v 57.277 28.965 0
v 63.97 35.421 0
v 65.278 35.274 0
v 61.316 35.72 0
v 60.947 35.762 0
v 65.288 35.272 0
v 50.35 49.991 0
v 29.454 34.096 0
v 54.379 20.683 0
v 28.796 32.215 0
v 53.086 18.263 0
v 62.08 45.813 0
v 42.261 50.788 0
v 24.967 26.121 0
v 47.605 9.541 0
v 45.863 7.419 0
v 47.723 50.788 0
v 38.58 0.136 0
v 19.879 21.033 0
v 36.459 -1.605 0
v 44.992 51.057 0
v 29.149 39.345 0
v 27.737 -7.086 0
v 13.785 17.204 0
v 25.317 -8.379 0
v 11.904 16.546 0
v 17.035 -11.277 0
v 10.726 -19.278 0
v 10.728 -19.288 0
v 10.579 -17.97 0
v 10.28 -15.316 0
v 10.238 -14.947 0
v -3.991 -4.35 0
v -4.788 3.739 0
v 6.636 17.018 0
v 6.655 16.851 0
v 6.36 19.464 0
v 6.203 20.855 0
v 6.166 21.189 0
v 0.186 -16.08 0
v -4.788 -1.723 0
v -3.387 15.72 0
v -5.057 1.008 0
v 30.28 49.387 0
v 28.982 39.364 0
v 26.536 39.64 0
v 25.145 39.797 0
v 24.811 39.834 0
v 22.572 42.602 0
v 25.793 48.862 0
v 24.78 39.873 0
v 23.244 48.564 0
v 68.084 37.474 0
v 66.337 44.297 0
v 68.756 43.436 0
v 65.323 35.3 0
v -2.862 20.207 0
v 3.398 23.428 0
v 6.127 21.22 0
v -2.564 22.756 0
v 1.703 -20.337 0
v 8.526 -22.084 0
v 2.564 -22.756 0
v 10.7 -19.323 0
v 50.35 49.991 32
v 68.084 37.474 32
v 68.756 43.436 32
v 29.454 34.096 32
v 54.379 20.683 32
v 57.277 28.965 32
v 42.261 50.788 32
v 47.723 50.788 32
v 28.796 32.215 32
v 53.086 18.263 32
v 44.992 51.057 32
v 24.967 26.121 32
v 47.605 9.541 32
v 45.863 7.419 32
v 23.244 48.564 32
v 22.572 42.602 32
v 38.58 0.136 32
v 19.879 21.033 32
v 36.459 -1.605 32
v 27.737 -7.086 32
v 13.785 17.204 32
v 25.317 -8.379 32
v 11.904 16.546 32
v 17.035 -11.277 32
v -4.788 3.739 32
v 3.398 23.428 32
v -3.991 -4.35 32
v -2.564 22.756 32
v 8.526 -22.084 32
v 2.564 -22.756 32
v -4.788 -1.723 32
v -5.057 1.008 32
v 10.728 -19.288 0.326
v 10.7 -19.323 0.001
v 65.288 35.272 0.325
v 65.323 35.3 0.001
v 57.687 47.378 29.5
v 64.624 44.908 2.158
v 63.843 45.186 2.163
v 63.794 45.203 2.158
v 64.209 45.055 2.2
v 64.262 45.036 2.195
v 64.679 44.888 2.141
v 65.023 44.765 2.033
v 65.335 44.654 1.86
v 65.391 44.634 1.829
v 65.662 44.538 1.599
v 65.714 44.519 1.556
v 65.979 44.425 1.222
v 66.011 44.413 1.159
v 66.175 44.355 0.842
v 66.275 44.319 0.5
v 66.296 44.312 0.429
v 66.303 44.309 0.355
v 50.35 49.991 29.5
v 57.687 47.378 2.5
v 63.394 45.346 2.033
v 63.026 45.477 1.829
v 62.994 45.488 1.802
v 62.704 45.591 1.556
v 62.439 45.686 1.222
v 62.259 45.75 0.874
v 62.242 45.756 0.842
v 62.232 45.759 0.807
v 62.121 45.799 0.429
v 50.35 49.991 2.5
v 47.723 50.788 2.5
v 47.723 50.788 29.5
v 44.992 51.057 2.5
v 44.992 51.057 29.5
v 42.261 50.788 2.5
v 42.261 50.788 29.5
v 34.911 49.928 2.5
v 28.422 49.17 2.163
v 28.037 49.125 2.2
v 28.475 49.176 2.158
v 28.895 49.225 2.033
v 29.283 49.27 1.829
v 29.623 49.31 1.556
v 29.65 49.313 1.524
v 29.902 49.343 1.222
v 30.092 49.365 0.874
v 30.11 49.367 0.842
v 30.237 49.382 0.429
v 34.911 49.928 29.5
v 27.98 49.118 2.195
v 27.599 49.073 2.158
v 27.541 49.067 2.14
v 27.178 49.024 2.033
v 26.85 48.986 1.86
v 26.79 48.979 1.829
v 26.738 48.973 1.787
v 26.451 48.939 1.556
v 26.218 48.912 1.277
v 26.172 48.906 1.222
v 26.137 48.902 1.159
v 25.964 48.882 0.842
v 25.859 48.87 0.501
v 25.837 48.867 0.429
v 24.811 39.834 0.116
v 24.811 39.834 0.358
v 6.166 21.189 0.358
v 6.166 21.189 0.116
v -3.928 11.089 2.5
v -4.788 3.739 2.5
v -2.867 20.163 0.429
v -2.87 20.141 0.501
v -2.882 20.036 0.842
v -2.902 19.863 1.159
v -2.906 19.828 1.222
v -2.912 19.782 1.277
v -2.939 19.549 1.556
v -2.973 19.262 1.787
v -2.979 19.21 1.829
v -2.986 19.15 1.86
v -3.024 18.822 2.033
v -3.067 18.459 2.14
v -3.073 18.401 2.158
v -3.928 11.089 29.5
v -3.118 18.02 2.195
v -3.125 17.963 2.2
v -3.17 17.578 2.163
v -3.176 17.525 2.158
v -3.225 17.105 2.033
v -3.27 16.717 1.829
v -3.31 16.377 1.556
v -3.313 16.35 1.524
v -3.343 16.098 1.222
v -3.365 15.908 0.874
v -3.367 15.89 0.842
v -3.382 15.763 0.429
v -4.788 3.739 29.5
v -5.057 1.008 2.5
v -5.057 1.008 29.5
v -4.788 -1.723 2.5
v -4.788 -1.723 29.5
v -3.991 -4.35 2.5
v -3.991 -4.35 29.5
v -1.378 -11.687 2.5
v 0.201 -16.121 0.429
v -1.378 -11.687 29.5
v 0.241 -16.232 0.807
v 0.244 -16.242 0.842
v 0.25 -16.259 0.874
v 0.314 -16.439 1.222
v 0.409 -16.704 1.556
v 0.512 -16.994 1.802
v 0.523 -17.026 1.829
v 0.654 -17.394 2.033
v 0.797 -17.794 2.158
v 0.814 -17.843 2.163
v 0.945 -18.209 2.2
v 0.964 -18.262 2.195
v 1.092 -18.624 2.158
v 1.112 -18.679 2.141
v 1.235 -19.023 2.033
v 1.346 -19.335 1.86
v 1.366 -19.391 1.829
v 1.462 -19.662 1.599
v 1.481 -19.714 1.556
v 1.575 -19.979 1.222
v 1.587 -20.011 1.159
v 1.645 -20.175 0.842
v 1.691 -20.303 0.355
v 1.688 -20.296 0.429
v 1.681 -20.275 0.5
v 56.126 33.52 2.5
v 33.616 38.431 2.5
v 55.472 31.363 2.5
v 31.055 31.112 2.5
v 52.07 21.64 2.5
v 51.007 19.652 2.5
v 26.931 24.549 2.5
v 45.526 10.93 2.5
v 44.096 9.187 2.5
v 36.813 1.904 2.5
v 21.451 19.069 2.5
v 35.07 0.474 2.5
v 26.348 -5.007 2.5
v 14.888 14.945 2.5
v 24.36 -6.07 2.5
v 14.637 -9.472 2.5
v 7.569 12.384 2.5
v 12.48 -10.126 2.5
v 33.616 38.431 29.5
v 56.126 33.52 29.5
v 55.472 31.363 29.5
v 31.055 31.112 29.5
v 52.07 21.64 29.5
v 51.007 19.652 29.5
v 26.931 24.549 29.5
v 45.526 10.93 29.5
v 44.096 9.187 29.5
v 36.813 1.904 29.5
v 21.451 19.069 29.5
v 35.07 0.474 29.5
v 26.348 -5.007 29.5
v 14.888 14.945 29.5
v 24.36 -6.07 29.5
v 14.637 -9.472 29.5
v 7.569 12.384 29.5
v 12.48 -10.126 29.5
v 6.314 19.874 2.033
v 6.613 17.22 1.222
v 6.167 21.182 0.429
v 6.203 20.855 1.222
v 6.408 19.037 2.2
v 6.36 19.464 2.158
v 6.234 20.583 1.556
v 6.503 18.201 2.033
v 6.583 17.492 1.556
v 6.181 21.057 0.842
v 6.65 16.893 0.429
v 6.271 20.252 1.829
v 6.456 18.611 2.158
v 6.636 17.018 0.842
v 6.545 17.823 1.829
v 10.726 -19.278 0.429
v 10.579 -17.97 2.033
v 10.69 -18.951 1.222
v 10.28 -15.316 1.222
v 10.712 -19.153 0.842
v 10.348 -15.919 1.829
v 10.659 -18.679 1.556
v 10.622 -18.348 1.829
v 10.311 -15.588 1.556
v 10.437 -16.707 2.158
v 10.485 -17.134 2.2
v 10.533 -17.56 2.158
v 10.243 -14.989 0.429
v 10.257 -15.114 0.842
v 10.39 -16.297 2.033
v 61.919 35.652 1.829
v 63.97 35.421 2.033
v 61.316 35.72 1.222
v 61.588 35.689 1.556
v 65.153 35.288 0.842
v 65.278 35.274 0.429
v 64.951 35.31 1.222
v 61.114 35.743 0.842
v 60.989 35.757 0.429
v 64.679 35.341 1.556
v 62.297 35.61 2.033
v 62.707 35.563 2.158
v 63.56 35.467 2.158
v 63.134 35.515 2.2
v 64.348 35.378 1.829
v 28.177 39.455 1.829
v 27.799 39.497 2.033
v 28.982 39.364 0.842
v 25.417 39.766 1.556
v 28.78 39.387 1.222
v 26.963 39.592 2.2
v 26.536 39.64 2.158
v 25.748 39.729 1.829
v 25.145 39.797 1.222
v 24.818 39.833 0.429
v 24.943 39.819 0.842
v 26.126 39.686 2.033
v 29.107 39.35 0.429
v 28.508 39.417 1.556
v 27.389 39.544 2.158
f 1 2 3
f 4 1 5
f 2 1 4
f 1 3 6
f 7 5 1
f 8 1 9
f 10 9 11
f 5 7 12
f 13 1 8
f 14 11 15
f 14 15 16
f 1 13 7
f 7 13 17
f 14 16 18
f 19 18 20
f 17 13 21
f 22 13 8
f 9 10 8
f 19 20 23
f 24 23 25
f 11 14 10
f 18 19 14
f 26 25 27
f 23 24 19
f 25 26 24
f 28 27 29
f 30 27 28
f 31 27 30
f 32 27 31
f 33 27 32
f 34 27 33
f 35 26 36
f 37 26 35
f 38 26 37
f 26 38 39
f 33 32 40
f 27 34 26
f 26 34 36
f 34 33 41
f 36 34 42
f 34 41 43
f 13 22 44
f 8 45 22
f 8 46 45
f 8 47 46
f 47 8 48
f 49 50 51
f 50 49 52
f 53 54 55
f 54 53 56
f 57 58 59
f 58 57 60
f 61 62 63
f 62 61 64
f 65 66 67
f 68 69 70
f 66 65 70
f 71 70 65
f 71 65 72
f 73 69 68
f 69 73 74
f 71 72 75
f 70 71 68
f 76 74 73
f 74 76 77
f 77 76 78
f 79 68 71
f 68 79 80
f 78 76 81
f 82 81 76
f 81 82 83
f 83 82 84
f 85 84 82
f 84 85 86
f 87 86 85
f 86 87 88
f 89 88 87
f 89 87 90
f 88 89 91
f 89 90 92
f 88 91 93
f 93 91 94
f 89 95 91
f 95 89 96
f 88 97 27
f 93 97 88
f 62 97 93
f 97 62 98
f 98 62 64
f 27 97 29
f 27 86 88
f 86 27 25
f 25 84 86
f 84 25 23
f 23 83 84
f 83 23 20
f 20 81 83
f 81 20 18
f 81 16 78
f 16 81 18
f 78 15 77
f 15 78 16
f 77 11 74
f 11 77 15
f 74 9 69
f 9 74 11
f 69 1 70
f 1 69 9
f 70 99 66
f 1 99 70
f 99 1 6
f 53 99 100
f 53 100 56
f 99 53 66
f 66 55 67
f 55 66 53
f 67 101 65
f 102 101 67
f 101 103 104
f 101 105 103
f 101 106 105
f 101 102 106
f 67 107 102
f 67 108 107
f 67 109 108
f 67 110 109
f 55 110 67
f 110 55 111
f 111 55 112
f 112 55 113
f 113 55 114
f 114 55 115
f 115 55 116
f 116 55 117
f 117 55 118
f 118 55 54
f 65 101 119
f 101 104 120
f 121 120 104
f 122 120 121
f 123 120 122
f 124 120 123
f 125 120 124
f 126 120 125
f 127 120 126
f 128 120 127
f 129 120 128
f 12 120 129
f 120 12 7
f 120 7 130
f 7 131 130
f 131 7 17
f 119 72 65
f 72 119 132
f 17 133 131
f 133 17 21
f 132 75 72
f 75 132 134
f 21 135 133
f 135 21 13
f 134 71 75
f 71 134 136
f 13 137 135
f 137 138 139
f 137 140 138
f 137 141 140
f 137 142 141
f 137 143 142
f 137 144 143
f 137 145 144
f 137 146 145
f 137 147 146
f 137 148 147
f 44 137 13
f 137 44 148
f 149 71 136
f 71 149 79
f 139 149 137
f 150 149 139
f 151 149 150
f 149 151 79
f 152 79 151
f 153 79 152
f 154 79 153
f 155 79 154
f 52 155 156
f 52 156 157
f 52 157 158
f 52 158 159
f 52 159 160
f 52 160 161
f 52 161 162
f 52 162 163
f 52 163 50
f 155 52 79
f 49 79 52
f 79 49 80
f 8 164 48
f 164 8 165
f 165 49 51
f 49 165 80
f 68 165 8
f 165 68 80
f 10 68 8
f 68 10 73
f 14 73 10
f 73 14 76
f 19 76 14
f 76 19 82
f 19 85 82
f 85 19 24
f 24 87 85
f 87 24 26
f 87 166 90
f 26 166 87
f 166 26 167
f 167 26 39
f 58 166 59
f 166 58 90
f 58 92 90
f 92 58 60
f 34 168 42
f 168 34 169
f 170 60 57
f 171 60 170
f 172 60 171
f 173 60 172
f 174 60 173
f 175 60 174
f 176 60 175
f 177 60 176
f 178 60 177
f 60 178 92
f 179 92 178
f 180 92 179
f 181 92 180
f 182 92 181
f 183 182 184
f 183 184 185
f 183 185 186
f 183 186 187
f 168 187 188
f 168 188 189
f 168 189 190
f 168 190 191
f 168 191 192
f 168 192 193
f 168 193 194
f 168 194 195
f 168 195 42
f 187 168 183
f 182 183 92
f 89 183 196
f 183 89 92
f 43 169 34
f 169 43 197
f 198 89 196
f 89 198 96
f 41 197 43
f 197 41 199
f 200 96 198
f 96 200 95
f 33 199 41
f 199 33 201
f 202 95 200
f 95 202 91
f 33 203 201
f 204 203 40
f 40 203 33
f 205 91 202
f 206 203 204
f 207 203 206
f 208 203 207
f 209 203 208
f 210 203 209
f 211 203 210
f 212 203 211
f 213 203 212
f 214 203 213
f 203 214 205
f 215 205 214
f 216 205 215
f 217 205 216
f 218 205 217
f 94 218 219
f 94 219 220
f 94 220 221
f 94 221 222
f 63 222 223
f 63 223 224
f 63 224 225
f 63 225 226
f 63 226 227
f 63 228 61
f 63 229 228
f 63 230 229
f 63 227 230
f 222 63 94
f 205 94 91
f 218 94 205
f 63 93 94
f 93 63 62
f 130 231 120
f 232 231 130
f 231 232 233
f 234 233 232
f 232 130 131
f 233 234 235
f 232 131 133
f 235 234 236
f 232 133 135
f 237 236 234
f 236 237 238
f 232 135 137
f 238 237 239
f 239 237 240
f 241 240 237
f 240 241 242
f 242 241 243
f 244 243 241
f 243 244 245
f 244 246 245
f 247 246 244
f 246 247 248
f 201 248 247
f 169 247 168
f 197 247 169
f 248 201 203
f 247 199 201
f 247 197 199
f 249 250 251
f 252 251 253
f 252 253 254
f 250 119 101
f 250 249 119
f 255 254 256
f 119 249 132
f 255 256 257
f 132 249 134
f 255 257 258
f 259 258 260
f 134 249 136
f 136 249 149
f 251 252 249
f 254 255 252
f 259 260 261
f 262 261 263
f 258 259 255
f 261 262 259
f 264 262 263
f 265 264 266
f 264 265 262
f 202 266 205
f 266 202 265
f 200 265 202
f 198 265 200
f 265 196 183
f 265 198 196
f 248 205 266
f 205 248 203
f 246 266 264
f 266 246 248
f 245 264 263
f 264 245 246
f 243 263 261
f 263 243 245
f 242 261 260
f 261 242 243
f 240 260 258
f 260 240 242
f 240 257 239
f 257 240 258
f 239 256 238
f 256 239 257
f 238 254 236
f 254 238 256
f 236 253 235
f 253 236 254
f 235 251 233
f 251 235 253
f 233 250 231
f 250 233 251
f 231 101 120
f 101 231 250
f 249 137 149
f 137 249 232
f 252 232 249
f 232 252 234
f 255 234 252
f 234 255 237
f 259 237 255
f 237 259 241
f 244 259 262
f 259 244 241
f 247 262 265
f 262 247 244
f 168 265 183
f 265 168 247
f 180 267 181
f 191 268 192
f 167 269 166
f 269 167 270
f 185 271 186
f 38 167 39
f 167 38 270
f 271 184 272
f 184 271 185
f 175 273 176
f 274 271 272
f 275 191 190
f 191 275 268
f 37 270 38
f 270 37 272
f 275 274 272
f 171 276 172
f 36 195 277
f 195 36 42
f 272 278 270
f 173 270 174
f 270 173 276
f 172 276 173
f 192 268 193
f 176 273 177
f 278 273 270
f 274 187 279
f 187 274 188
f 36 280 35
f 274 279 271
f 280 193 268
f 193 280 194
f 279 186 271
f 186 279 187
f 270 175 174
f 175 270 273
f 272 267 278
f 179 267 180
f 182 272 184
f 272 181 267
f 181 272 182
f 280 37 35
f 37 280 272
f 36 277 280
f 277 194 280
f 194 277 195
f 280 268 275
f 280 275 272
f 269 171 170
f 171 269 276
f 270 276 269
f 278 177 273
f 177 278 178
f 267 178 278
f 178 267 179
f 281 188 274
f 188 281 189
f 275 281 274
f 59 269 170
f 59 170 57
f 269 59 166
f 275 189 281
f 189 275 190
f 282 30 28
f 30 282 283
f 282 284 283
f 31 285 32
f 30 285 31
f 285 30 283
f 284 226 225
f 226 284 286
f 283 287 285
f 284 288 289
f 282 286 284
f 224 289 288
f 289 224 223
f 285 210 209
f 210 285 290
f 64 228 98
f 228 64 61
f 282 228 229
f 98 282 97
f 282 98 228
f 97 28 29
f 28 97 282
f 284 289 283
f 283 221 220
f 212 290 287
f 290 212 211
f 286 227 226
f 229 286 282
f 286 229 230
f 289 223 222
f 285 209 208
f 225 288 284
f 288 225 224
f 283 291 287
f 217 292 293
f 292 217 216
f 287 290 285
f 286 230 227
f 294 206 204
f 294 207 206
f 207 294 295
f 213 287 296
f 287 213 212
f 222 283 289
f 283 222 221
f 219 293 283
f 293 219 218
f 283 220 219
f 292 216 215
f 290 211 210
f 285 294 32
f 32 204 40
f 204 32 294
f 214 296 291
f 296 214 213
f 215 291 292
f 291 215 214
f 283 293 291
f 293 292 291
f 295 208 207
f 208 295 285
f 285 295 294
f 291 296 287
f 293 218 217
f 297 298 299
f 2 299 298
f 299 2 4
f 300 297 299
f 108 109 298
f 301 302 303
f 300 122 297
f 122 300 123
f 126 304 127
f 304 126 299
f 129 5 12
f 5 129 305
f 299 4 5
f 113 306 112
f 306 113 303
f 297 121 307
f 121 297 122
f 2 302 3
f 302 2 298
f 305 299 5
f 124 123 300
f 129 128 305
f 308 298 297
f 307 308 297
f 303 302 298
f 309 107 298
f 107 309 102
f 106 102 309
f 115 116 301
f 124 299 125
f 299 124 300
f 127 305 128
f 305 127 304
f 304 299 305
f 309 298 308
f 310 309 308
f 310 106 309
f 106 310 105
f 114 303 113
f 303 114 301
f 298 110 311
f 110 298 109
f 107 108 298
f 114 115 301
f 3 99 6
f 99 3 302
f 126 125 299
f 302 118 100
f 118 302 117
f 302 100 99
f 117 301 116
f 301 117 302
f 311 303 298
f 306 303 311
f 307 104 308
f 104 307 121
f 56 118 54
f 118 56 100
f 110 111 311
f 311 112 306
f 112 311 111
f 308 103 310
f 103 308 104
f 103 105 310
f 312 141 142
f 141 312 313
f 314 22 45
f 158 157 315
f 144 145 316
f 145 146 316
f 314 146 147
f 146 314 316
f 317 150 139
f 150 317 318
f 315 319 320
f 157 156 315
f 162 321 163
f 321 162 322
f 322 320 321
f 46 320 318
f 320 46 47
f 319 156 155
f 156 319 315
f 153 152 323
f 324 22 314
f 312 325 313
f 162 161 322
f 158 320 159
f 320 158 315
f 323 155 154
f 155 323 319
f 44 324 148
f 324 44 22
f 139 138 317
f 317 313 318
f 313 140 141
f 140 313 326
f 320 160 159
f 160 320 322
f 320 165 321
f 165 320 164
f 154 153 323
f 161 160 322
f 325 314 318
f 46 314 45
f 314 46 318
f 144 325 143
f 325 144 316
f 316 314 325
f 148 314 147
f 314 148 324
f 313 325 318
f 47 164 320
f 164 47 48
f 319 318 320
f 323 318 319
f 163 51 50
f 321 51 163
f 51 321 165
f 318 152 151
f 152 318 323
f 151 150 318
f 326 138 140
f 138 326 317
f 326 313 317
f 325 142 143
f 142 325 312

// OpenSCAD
$fn = 32;

// ----------------------------------------------------------------------
// Air duct: 28 mm duct, 2.5 mm wall, 32 mm across
// ----------------------------------------------------------------------

// --- parameters (mm) ---
duct_r = 14;              // duct core radius
duct_d = 28;              // duct core diameter
wall = 2.5;               // duct wall thickness
height = 32;              // duct width (extrusion height)
port_r = 22.9;            // port flange half width
port_d = 45.8;            // port flange width
port_t = 6;               // port flange thickness
bolt_d = 4.4;             // port bolt holes
bolt_offset = 18.2;       // bolt hole offset from the port axis

difference() {
  /* outer hull chain: tube with a flat flange plate at every port */
  linear_extrude(height = 32) {
    hull() {
      polygon([[2.564, -22.756], [-2.564, 22.756], [3.398, 23.428], [8.526, -22.084]]);
      translate([8.943, 1.008]) circle(r = 14);
    }
    hull() {
      translate([8.943, 1.008]) circle(r = 14);
      translate([10.236, 1.153]) circle(r = 14);
    }
    hull() {
      translate([10.236, 1.153]) circle(r = 14);
      translate([19.959, 4.555]) circle(r = 14);
    }
    hull() {
      translate([19.959, 4.555]) circle(r = 14);
      translate([28.681, 10.036]) circle(r = 14);
    }
    hull() {
      translate([28.681, 10.036]) circle(r = 14);
      translate([35.964, 17.319]) circle(r = 14);
    }
    hull() {
      translate([35.964, 17.319]) circle(r = 14);
      translate([41.445, 26.041]) circle(r = 14);
    }
    hull() {
      translate([41.445, 26.041]) circle(r = 14);
      translate([44.847, 35.764]) circle(r = 14);
    }
    hull() {
      translate([44.847, 35.764]) circle(r = 14);
      translate([44.992, 37.057]) circle(r = 14);
    }
    hull() {
      translate([44.992, 37.057]) circle(r = 14);
      polygon([[23.244, 48.564], [68.756, 43.436], [68.084, 37.474], [22.572, 42.602]]);
    }
  }
  /* air passage: the same chain inset by the wall, 5 mm proud of the ports */
  translate([0, 0, 2.5]) linear_extrude(height = 27) {
    hull() {
      translate([-4.969, -0.56]) circle(r = 11.5);
      translate([10.236, 1.153]) circle(r = 11.5);
    }
    hull() {
      translate([10.236, 1.153]) circle(r = 11.5);
      translate([19.959, 4.555]) circle(r = 11.5);
    }
    hull() {
      translate([19.959, 4.555]) circle(r = 11.5);
      translate([28.681, 10.036]) circle(r = 11.5);
    }
    hull() {
      translate([28.681, 10.036]) circle(r = 11.5);
      translate([35.964, 17.319]) circle(r = 11.5);
    }
    hull() {
      translate([35.964, 17.319]) circle(r = 11.5);
      translate([41.445, 26.041]) circle(r = 11.5);
    }
    hull() {
      translate([41.445, 26.041]) circle(r = 11.5);
      translate([44.847, 35.764]) circle(r = 11.5);
    }
    hull() {
      translate([44.847, 35.764]) circle(r = 11.5);
      translate([46.56, 50.969]) circle(r = 11.5);
    }
  }
  translate([0, 0]) rotate([0, 0, -83.57]) translate([-18.2, -2.5]) rotate([-90, 0, 0]) cylinder(h = 11, d = 4.4);
  translate([0, 0]) rotate([0, 0, -83.57]) translate([18.2, -2.5]) rotate([-90, 0, 0]) cylinder(h = 11, d = 4.4);
  translate([46, 46]) rotate([0, 0, 173.57]) translate([-18.2, -2.5]) rotate([-90, 0, 0]) cylinder(h = 11, d = 4.4);
  translate([46, 46]) rotate([0, 0, 173.57]) translate([18.2, -2.5]) rotate([-90, 0, 0]) cylinder(h = 11, d = 4.4);
}
